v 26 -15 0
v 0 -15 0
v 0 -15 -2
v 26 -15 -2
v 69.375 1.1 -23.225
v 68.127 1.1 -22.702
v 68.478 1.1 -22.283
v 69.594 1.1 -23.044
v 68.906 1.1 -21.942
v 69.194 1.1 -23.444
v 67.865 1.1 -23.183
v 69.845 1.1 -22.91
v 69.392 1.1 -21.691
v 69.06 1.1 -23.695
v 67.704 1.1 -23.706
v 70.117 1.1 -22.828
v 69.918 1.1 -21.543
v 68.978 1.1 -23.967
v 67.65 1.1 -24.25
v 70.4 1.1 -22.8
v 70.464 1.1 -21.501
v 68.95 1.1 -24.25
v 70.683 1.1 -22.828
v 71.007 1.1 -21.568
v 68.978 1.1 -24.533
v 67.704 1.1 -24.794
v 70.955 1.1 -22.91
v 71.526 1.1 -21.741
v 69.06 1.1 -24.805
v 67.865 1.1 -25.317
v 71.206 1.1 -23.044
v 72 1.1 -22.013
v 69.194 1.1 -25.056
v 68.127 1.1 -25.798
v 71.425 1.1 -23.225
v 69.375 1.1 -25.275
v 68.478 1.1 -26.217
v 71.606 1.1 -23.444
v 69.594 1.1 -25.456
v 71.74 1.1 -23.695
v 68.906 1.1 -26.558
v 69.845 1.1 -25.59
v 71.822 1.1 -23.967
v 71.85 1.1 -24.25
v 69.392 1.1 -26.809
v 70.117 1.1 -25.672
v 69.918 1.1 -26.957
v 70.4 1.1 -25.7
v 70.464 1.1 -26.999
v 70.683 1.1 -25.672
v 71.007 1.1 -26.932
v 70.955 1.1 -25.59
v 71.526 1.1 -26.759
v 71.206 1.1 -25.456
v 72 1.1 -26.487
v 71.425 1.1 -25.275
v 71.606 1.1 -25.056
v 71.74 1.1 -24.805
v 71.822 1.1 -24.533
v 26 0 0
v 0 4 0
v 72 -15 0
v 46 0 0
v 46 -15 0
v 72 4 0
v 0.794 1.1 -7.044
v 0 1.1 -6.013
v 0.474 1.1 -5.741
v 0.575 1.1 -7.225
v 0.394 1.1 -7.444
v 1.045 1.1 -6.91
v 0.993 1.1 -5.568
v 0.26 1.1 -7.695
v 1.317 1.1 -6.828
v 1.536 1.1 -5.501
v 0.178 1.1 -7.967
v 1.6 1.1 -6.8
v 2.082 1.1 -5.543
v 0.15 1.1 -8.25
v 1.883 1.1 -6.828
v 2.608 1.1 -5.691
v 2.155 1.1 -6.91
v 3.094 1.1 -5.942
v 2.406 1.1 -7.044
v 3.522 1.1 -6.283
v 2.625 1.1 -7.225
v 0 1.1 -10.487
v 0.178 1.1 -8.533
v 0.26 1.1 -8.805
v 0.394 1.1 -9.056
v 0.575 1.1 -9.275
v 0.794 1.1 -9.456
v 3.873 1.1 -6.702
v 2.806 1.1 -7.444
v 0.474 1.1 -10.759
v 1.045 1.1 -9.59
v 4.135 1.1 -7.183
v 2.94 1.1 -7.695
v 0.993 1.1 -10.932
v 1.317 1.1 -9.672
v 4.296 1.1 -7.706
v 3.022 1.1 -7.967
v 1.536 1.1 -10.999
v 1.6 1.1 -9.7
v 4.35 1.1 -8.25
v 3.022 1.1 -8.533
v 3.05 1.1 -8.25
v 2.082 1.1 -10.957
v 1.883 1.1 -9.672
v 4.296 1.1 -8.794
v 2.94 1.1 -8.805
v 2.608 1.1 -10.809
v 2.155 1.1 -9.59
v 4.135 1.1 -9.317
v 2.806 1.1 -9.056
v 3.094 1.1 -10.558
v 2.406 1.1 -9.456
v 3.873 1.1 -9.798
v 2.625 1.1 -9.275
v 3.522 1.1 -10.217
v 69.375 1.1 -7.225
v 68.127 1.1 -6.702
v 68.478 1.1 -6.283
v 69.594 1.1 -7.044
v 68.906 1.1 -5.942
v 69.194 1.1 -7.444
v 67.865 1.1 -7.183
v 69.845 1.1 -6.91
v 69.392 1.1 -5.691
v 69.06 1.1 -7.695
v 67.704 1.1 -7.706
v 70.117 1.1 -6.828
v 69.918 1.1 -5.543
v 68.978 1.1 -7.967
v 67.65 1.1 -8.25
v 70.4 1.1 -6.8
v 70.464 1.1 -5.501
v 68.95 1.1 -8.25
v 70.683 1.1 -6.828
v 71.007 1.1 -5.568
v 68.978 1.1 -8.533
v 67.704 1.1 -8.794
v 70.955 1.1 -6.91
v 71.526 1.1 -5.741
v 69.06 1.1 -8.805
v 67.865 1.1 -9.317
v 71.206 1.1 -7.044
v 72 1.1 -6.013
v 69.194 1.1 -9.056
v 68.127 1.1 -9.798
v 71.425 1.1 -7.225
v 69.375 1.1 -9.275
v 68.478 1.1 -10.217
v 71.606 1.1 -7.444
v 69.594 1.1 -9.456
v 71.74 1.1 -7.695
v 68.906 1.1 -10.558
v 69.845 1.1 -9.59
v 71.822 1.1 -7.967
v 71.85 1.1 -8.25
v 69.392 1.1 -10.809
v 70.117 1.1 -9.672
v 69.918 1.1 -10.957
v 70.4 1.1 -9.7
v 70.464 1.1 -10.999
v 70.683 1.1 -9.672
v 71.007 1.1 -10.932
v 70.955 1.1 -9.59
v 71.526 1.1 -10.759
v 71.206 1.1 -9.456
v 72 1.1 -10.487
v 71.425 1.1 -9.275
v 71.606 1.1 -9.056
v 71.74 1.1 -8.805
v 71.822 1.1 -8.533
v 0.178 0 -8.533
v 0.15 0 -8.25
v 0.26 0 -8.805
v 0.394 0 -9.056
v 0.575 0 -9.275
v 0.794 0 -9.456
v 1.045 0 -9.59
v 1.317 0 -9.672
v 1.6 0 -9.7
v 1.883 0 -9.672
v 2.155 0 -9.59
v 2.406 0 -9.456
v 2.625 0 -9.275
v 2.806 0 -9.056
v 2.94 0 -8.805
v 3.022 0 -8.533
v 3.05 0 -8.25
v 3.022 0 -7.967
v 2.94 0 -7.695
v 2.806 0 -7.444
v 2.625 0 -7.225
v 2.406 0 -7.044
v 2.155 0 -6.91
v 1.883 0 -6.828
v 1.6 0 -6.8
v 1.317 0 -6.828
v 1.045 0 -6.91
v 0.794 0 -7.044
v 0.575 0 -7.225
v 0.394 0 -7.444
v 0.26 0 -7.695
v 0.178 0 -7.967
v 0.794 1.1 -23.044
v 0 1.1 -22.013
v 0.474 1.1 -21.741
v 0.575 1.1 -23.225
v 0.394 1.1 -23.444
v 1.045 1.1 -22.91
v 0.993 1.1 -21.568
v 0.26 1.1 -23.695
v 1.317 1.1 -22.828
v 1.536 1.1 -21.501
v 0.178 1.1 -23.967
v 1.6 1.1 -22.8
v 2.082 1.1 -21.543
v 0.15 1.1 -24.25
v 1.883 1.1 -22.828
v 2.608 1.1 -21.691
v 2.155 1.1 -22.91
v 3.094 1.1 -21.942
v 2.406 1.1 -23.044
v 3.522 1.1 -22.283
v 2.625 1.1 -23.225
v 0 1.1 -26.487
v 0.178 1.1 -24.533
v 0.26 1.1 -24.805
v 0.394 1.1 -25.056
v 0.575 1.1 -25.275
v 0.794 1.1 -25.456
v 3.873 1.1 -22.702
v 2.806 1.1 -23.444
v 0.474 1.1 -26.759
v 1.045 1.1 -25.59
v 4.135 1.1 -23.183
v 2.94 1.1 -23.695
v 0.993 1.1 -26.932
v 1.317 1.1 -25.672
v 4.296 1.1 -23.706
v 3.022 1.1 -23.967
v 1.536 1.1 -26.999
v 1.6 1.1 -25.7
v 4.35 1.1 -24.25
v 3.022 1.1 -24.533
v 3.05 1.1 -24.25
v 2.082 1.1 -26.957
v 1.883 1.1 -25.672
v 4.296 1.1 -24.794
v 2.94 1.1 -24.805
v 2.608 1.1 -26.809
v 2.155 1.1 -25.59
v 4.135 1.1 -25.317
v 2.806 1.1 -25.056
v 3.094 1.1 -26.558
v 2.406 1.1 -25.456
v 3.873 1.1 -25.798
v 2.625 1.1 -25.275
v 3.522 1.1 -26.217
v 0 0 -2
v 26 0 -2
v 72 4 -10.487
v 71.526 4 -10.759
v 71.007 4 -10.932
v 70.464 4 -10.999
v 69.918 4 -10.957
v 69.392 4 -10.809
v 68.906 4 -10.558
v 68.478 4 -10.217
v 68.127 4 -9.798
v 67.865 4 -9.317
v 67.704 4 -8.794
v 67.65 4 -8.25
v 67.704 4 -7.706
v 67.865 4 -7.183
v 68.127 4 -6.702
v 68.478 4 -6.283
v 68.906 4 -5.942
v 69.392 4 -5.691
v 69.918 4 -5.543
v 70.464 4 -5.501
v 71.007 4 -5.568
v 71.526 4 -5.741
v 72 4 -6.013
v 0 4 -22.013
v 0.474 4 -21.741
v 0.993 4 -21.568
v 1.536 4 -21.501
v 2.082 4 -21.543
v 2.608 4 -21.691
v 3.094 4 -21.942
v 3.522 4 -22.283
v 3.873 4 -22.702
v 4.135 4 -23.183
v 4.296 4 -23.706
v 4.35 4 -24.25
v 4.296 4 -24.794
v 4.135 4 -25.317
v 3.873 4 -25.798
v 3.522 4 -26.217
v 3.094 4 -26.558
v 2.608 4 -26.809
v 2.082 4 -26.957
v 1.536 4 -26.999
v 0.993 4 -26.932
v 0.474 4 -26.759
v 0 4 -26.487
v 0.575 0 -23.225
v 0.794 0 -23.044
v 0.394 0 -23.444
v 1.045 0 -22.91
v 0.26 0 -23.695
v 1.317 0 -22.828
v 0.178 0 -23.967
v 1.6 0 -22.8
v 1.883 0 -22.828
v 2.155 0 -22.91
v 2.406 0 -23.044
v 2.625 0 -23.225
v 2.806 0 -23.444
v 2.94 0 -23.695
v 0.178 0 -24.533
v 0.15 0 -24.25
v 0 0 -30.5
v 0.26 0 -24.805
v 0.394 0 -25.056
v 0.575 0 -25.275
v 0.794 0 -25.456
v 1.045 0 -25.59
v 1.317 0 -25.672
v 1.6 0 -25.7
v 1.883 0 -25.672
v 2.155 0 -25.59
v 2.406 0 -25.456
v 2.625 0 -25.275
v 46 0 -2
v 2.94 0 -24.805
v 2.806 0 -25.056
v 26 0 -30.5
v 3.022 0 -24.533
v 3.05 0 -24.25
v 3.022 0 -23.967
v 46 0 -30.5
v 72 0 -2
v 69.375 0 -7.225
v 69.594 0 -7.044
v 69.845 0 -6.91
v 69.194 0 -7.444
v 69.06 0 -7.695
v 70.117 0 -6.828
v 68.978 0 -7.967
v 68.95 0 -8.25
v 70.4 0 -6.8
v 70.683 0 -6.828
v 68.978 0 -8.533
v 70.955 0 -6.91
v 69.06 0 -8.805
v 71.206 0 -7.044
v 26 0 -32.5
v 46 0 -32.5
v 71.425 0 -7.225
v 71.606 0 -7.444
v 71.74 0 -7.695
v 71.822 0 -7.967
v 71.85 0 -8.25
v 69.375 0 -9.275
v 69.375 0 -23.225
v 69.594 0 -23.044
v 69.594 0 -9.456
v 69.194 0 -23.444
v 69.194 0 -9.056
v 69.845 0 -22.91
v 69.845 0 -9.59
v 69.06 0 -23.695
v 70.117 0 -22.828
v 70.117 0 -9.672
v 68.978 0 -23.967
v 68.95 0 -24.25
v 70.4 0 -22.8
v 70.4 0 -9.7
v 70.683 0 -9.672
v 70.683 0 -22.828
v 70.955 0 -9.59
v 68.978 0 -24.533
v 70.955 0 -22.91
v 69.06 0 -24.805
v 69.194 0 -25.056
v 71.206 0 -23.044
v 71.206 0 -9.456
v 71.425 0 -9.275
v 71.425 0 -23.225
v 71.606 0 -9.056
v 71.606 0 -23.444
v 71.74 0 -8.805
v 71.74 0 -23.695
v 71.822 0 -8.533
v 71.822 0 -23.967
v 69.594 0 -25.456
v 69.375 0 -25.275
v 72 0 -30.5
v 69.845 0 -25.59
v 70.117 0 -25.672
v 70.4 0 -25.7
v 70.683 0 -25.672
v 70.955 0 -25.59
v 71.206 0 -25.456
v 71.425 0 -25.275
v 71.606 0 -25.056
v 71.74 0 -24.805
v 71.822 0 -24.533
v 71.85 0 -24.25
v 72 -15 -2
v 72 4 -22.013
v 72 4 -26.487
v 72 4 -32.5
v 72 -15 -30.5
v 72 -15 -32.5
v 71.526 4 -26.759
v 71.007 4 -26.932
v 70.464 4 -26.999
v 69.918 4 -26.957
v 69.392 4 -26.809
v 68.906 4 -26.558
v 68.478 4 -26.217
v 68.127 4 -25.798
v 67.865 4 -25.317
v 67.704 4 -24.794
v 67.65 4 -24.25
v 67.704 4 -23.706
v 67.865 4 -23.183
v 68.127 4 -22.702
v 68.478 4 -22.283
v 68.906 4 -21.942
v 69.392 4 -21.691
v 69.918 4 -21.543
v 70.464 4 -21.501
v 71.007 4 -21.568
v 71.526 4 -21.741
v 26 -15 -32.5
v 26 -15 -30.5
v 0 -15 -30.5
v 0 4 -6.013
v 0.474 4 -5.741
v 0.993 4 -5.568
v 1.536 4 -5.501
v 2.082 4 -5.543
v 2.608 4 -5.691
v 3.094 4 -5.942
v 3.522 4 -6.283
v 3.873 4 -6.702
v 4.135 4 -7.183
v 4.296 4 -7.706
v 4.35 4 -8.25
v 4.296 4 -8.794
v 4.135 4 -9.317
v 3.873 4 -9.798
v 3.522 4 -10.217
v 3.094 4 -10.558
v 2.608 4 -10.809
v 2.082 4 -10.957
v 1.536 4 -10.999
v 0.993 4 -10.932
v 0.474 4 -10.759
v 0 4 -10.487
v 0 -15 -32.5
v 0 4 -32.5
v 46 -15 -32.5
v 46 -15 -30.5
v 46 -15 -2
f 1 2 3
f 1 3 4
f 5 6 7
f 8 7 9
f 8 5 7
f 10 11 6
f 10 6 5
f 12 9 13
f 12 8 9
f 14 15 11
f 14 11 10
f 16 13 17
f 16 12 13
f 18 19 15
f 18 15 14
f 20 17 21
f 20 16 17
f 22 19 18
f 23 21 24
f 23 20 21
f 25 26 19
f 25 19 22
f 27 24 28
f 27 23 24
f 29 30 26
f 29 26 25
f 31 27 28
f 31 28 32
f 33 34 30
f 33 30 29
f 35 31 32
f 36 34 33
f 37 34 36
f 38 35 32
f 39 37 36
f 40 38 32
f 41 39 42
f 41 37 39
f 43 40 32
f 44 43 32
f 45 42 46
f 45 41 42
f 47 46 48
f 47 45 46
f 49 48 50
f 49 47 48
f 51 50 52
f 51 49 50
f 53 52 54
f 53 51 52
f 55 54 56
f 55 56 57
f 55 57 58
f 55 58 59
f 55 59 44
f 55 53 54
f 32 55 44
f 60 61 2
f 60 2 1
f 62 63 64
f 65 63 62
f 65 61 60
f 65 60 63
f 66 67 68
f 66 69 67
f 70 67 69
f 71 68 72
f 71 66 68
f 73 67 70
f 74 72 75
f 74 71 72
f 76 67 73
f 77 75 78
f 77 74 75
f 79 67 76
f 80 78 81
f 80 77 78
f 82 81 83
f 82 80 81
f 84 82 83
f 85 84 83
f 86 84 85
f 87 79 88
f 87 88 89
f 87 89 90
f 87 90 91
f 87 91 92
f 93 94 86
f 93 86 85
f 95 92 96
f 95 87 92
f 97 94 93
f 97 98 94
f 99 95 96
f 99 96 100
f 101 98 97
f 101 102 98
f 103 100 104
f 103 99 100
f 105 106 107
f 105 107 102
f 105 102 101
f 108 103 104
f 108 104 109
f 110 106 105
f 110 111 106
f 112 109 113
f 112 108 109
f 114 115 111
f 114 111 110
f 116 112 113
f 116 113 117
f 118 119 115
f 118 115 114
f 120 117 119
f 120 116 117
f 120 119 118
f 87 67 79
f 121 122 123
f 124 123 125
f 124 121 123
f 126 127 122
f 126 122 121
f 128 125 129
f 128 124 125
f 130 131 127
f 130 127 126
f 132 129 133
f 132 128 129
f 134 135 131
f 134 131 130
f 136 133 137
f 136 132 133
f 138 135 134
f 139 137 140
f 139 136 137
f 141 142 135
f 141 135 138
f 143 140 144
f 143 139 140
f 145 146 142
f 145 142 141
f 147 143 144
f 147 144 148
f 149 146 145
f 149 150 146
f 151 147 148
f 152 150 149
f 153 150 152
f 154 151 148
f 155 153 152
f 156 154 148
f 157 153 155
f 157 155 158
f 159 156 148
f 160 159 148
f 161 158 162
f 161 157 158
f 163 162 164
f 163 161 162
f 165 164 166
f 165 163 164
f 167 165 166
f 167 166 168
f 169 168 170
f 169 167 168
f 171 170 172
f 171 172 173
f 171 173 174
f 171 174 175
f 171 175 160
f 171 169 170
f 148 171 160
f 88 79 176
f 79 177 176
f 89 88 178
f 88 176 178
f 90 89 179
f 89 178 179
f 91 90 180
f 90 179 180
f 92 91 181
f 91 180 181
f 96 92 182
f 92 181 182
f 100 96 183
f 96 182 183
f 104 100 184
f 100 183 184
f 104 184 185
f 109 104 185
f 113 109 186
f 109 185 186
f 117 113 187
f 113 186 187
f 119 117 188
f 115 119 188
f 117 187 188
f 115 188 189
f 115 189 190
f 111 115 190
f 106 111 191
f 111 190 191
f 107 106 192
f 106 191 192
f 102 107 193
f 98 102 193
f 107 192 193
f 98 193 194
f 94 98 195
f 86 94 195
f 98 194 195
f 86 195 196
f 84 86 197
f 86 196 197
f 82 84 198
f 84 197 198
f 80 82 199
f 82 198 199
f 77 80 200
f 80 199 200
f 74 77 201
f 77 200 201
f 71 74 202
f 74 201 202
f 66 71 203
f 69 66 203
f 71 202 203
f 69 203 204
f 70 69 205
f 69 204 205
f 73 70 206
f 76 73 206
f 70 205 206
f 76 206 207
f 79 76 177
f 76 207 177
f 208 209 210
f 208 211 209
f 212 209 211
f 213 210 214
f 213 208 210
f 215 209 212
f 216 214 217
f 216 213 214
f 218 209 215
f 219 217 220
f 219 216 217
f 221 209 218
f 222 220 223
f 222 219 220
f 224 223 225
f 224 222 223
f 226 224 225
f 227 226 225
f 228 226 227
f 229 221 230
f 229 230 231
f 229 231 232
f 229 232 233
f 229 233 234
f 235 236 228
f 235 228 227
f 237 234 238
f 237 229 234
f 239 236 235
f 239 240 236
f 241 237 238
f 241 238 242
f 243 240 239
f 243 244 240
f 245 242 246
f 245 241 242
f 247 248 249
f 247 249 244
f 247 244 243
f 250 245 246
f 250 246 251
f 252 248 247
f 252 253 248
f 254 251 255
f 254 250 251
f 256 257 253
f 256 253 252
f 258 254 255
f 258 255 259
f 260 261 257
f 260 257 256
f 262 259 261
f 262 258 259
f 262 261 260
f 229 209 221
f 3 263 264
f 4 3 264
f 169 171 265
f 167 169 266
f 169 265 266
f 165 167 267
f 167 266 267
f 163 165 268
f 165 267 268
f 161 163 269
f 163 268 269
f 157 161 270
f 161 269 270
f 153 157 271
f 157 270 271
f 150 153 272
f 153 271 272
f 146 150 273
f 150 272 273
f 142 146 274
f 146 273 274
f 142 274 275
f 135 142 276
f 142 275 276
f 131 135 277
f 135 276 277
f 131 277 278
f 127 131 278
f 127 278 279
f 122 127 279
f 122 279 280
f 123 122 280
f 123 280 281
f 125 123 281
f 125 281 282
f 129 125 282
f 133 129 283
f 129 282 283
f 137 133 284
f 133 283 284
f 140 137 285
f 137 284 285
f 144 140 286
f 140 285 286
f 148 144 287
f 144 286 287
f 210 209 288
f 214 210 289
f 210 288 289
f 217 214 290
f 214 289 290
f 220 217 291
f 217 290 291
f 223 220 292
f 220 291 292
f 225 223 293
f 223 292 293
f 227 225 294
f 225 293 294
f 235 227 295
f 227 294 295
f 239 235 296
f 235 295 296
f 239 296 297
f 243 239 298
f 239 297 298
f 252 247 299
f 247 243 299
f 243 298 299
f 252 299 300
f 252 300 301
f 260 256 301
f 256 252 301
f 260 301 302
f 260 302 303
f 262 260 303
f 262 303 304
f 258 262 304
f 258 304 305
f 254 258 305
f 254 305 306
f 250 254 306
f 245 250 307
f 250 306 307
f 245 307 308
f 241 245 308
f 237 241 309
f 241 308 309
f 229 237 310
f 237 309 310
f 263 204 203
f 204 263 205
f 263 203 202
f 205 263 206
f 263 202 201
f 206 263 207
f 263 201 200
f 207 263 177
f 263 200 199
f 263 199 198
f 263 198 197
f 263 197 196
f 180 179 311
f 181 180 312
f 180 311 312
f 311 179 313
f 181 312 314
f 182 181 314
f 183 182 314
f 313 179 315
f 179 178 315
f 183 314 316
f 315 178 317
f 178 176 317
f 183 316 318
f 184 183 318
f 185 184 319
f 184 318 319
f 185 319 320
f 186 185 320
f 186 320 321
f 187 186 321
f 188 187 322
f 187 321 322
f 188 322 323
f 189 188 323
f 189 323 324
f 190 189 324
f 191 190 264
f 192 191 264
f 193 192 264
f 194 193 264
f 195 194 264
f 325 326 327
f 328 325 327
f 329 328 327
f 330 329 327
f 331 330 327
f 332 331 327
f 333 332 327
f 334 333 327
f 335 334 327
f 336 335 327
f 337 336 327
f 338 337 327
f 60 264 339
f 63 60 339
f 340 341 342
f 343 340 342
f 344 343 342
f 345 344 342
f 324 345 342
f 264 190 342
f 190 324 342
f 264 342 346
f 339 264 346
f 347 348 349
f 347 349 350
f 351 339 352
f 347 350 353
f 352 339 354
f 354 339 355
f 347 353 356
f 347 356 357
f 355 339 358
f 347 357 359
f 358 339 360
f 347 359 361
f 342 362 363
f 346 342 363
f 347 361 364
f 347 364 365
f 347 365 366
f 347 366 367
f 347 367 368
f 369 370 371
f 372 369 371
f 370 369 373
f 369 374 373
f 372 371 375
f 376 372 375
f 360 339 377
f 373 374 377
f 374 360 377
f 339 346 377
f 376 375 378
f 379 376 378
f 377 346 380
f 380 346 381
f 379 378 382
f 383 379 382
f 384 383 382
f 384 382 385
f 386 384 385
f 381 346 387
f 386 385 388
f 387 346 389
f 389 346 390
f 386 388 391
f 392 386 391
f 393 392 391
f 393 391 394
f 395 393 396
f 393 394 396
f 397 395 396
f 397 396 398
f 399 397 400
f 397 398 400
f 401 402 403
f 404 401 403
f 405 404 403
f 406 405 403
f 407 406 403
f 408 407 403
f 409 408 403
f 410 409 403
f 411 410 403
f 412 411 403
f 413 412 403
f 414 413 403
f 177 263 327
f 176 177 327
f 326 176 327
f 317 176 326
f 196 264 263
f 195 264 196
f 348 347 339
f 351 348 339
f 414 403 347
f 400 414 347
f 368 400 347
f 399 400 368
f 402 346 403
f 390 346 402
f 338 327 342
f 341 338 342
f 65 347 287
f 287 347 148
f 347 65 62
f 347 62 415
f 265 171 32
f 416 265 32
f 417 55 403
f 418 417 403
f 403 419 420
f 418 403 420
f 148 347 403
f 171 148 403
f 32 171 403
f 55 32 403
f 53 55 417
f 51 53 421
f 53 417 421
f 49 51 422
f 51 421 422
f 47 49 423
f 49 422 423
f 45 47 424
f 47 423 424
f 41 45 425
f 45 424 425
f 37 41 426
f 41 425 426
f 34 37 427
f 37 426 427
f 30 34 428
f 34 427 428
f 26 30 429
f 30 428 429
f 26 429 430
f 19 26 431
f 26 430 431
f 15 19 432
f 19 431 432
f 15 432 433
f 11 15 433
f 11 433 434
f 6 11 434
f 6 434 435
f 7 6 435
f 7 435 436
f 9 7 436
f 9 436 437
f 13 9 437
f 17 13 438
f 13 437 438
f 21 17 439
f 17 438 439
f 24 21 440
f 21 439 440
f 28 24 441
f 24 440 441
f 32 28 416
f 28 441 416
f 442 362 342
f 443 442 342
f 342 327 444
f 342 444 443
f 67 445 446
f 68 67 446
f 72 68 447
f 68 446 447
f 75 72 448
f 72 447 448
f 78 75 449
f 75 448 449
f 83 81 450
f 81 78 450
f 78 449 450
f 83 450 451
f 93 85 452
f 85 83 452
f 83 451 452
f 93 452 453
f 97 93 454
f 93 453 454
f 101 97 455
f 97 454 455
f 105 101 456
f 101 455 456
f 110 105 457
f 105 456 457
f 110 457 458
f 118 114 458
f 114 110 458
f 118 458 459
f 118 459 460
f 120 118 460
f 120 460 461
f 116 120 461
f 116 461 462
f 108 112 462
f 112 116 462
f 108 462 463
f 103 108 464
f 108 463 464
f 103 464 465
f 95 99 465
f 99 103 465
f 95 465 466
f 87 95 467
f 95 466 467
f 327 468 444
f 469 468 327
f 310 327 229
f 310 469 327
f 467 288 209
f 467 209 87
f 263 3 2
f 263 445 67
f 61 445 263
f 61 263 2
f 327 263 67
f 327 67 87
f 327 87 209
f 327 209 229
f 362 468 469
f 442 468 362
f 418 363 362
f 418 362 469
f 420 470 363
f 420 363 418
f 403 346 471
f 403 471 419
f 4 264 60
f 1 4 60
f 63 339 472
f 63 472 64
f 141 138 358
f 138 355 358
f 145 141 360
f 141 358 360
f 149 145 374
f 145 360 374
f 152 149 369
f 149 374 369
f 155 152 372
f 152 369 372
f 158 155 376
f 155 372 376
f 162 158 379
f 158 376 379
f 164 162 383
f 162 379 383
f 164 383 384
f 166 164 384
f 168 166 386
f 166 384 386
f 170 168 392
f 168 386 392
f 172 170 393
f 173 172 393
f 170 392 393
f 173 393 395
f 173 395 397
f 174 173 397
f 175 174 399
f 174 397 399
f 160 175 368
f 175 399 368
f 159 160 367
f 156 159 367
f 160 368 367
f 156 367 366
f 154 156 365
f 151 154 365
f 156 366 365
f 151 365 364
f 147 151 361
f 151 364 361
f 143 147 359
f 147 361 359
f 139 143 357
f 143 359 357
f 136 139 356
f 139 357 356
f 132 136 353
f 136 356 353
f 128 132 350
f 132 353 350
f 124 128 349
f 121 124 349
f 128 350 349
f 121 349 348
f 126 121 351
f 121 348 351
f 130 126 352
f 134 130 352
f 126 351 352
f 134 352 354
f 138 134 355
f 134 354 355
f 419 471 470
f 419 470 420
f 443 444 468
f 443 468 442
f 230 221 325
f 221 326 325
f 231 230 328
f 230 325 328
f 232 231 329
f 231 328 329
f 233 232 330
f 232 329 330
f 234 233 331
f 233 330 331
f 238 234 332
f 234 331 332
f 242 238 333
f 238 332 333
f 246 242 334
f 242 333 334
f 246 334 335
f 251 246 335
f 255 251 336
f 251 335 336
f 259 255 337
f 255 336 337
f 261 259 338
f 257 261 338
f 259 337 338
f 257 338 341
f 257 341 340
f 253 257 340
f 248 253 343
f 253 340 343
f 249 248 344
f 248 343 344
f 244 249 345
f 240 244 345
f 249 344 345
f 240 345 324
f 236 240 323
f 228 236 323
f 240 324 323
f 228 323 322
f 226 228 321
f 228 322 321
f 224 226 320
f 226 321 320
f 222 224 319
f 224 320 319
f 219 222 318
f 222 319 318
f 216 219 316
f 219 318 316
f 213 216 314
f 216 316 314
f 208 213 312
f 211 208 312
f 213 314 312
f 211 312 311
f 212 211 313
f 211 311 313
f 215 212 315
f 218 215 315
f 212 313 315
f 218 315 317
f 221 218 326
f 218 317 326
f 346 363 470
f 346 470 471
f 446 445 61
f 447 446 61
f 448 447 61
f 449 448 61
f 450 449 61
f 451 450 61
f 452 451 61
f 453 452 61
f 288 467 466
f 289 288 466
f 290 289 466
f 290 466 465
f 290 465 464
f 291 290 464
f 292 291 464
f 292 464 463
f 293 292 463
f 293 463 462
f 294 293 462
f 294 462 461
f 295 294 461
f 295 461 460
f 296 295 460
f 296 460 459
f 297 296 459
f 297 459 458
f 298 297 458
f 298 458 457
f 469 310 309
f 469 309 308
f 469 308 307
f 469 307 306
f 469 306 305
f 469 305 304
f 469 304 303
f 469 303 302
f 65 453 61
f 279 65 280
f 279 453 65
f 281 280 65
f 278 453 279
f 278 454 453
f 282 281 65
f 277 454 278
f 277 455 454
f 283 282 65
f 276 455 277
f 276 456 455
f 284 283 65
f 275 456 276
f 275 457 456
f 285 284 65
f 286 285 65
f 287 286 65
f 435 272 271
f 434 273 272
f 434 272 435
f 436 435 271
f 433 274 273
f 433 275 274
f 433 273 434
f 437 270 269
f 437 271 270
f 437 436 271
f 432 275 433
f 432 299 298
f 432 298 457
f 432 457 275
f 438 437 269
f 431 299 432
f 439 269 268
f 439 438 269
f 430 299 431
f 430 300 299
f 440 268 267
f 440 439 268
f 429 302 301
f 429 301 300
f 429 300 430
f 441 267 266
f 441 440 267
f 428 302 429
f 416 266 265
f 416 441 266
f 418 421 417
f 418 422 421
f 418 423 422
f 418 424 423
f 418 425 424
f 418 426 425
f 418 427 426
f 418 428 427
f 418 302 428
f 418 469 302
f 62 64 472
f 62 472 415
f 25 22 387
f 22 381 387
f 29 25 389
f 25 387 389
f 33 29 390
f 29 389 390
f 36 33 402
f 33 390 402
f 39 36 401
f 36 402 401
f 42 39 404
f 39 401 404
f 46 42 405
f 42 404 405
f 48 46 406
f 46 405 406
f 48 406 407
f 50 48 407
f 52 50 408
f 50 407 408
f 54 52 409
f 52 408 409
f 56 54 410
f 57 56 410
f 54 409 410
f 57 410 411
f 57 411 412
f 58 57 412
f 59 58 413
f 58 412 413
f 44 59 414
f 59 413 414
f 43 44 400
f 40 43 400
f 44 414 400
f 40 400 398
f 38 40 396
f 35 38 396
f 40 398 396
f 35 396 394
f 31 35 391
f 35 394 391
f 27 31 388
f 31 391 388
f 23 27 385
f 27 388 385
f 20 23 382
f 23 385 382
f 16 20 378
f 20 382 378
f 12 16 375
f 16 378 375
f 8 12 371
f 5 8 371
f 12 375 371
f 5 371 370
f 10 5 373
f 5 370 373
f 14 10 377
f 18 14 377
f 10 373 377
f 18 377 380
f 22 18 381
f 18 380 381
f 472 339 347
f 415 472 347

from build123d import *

# Parameters (mm, degrees)
SKETCH1_W                                            = 72
SKETCH1_H                                            = 32.5
BOSS_EXTRUDE1_DEPTH                                  = 4
CBORE_FOR_M2_5_HEX_SOCKET_HEAD_CAP_SCREW_D           = 2.9
CBORE_FOR_M2_5_HEX_SOCKET_HEAD_CAP_SCREW_CBORE_D     = 5.5
CBORE_FOR_M2_5_HEX_SOCKET_HEAD_CAP_SCREW_CBORE_DEPTH = 2.9
SKETCH5_W                                            = 26
SKETCH5_H                                            = 2
BOSS_EXTRUDE2_DEPTH                                  = 15


with BuildPart() as part:
    # Sketch1 → Boss-Extrude1 (new body)
    with BuildSketch(Plane(origin=(0, 0, 0), x_dir=(1, 0, 0), z_dir=(0, 1, 0))):
        with Locations((36, 16.25)):
            Rectangle(SKETCH1_W, SKETCH1_H)
    extrude(amount=BOSS_EXTRUDE1_DEPTH)

    # CBORE for M2.5 Hex Socket Head Cap Screw1 (through all)
    with Locations(Plane(origin=(0, 4, 0), x_dir=(1, 0, 0), z_dir=(0, 1, 0))):
        with Locations((-10.4, 24.25), (1.6, 24.25), (1.6, 8.25), (-10.4, 8.25), (82.4, 8.25), (70.4, 8.25), (70.4, 24.25), (82.4, 24.25)):
            CounterBoreHole(CBORE_FOR_M2_5_HEX_SOCKET_HEAD_CAP_SCREW_D / 2, CBORE_FOR_M2_5_HEX_SOCKET_HEAD_CAP_SCREW_CBORE_D / 2, CBORE_FOR_M2_5_HEX_SOCKET_HEAD_CAP_SCREW_CBORE_DEPTH)

    # Sketch5 → Boss-Extrude2 (add)
    with BuildSketch(Plane.XZ):
        with Locations((13, -1)):
            Rectangle(SKETCH5_W, SKETCH5_H)
        with Locations((13, -31.5)):
            Rectangle(SKETCH5_W, SKETCH5_H)
        with Locations((59, -1)):
            Rectangle(SKETCH5_W, SKETCH5_H)
        with Locations((59, -31.5)):
            Rectangle(SKETCH5_W, SKETCH5_H)
    extrude(amount=BOSS_EXTRUDE2_DEPTH)


solid = part.part
